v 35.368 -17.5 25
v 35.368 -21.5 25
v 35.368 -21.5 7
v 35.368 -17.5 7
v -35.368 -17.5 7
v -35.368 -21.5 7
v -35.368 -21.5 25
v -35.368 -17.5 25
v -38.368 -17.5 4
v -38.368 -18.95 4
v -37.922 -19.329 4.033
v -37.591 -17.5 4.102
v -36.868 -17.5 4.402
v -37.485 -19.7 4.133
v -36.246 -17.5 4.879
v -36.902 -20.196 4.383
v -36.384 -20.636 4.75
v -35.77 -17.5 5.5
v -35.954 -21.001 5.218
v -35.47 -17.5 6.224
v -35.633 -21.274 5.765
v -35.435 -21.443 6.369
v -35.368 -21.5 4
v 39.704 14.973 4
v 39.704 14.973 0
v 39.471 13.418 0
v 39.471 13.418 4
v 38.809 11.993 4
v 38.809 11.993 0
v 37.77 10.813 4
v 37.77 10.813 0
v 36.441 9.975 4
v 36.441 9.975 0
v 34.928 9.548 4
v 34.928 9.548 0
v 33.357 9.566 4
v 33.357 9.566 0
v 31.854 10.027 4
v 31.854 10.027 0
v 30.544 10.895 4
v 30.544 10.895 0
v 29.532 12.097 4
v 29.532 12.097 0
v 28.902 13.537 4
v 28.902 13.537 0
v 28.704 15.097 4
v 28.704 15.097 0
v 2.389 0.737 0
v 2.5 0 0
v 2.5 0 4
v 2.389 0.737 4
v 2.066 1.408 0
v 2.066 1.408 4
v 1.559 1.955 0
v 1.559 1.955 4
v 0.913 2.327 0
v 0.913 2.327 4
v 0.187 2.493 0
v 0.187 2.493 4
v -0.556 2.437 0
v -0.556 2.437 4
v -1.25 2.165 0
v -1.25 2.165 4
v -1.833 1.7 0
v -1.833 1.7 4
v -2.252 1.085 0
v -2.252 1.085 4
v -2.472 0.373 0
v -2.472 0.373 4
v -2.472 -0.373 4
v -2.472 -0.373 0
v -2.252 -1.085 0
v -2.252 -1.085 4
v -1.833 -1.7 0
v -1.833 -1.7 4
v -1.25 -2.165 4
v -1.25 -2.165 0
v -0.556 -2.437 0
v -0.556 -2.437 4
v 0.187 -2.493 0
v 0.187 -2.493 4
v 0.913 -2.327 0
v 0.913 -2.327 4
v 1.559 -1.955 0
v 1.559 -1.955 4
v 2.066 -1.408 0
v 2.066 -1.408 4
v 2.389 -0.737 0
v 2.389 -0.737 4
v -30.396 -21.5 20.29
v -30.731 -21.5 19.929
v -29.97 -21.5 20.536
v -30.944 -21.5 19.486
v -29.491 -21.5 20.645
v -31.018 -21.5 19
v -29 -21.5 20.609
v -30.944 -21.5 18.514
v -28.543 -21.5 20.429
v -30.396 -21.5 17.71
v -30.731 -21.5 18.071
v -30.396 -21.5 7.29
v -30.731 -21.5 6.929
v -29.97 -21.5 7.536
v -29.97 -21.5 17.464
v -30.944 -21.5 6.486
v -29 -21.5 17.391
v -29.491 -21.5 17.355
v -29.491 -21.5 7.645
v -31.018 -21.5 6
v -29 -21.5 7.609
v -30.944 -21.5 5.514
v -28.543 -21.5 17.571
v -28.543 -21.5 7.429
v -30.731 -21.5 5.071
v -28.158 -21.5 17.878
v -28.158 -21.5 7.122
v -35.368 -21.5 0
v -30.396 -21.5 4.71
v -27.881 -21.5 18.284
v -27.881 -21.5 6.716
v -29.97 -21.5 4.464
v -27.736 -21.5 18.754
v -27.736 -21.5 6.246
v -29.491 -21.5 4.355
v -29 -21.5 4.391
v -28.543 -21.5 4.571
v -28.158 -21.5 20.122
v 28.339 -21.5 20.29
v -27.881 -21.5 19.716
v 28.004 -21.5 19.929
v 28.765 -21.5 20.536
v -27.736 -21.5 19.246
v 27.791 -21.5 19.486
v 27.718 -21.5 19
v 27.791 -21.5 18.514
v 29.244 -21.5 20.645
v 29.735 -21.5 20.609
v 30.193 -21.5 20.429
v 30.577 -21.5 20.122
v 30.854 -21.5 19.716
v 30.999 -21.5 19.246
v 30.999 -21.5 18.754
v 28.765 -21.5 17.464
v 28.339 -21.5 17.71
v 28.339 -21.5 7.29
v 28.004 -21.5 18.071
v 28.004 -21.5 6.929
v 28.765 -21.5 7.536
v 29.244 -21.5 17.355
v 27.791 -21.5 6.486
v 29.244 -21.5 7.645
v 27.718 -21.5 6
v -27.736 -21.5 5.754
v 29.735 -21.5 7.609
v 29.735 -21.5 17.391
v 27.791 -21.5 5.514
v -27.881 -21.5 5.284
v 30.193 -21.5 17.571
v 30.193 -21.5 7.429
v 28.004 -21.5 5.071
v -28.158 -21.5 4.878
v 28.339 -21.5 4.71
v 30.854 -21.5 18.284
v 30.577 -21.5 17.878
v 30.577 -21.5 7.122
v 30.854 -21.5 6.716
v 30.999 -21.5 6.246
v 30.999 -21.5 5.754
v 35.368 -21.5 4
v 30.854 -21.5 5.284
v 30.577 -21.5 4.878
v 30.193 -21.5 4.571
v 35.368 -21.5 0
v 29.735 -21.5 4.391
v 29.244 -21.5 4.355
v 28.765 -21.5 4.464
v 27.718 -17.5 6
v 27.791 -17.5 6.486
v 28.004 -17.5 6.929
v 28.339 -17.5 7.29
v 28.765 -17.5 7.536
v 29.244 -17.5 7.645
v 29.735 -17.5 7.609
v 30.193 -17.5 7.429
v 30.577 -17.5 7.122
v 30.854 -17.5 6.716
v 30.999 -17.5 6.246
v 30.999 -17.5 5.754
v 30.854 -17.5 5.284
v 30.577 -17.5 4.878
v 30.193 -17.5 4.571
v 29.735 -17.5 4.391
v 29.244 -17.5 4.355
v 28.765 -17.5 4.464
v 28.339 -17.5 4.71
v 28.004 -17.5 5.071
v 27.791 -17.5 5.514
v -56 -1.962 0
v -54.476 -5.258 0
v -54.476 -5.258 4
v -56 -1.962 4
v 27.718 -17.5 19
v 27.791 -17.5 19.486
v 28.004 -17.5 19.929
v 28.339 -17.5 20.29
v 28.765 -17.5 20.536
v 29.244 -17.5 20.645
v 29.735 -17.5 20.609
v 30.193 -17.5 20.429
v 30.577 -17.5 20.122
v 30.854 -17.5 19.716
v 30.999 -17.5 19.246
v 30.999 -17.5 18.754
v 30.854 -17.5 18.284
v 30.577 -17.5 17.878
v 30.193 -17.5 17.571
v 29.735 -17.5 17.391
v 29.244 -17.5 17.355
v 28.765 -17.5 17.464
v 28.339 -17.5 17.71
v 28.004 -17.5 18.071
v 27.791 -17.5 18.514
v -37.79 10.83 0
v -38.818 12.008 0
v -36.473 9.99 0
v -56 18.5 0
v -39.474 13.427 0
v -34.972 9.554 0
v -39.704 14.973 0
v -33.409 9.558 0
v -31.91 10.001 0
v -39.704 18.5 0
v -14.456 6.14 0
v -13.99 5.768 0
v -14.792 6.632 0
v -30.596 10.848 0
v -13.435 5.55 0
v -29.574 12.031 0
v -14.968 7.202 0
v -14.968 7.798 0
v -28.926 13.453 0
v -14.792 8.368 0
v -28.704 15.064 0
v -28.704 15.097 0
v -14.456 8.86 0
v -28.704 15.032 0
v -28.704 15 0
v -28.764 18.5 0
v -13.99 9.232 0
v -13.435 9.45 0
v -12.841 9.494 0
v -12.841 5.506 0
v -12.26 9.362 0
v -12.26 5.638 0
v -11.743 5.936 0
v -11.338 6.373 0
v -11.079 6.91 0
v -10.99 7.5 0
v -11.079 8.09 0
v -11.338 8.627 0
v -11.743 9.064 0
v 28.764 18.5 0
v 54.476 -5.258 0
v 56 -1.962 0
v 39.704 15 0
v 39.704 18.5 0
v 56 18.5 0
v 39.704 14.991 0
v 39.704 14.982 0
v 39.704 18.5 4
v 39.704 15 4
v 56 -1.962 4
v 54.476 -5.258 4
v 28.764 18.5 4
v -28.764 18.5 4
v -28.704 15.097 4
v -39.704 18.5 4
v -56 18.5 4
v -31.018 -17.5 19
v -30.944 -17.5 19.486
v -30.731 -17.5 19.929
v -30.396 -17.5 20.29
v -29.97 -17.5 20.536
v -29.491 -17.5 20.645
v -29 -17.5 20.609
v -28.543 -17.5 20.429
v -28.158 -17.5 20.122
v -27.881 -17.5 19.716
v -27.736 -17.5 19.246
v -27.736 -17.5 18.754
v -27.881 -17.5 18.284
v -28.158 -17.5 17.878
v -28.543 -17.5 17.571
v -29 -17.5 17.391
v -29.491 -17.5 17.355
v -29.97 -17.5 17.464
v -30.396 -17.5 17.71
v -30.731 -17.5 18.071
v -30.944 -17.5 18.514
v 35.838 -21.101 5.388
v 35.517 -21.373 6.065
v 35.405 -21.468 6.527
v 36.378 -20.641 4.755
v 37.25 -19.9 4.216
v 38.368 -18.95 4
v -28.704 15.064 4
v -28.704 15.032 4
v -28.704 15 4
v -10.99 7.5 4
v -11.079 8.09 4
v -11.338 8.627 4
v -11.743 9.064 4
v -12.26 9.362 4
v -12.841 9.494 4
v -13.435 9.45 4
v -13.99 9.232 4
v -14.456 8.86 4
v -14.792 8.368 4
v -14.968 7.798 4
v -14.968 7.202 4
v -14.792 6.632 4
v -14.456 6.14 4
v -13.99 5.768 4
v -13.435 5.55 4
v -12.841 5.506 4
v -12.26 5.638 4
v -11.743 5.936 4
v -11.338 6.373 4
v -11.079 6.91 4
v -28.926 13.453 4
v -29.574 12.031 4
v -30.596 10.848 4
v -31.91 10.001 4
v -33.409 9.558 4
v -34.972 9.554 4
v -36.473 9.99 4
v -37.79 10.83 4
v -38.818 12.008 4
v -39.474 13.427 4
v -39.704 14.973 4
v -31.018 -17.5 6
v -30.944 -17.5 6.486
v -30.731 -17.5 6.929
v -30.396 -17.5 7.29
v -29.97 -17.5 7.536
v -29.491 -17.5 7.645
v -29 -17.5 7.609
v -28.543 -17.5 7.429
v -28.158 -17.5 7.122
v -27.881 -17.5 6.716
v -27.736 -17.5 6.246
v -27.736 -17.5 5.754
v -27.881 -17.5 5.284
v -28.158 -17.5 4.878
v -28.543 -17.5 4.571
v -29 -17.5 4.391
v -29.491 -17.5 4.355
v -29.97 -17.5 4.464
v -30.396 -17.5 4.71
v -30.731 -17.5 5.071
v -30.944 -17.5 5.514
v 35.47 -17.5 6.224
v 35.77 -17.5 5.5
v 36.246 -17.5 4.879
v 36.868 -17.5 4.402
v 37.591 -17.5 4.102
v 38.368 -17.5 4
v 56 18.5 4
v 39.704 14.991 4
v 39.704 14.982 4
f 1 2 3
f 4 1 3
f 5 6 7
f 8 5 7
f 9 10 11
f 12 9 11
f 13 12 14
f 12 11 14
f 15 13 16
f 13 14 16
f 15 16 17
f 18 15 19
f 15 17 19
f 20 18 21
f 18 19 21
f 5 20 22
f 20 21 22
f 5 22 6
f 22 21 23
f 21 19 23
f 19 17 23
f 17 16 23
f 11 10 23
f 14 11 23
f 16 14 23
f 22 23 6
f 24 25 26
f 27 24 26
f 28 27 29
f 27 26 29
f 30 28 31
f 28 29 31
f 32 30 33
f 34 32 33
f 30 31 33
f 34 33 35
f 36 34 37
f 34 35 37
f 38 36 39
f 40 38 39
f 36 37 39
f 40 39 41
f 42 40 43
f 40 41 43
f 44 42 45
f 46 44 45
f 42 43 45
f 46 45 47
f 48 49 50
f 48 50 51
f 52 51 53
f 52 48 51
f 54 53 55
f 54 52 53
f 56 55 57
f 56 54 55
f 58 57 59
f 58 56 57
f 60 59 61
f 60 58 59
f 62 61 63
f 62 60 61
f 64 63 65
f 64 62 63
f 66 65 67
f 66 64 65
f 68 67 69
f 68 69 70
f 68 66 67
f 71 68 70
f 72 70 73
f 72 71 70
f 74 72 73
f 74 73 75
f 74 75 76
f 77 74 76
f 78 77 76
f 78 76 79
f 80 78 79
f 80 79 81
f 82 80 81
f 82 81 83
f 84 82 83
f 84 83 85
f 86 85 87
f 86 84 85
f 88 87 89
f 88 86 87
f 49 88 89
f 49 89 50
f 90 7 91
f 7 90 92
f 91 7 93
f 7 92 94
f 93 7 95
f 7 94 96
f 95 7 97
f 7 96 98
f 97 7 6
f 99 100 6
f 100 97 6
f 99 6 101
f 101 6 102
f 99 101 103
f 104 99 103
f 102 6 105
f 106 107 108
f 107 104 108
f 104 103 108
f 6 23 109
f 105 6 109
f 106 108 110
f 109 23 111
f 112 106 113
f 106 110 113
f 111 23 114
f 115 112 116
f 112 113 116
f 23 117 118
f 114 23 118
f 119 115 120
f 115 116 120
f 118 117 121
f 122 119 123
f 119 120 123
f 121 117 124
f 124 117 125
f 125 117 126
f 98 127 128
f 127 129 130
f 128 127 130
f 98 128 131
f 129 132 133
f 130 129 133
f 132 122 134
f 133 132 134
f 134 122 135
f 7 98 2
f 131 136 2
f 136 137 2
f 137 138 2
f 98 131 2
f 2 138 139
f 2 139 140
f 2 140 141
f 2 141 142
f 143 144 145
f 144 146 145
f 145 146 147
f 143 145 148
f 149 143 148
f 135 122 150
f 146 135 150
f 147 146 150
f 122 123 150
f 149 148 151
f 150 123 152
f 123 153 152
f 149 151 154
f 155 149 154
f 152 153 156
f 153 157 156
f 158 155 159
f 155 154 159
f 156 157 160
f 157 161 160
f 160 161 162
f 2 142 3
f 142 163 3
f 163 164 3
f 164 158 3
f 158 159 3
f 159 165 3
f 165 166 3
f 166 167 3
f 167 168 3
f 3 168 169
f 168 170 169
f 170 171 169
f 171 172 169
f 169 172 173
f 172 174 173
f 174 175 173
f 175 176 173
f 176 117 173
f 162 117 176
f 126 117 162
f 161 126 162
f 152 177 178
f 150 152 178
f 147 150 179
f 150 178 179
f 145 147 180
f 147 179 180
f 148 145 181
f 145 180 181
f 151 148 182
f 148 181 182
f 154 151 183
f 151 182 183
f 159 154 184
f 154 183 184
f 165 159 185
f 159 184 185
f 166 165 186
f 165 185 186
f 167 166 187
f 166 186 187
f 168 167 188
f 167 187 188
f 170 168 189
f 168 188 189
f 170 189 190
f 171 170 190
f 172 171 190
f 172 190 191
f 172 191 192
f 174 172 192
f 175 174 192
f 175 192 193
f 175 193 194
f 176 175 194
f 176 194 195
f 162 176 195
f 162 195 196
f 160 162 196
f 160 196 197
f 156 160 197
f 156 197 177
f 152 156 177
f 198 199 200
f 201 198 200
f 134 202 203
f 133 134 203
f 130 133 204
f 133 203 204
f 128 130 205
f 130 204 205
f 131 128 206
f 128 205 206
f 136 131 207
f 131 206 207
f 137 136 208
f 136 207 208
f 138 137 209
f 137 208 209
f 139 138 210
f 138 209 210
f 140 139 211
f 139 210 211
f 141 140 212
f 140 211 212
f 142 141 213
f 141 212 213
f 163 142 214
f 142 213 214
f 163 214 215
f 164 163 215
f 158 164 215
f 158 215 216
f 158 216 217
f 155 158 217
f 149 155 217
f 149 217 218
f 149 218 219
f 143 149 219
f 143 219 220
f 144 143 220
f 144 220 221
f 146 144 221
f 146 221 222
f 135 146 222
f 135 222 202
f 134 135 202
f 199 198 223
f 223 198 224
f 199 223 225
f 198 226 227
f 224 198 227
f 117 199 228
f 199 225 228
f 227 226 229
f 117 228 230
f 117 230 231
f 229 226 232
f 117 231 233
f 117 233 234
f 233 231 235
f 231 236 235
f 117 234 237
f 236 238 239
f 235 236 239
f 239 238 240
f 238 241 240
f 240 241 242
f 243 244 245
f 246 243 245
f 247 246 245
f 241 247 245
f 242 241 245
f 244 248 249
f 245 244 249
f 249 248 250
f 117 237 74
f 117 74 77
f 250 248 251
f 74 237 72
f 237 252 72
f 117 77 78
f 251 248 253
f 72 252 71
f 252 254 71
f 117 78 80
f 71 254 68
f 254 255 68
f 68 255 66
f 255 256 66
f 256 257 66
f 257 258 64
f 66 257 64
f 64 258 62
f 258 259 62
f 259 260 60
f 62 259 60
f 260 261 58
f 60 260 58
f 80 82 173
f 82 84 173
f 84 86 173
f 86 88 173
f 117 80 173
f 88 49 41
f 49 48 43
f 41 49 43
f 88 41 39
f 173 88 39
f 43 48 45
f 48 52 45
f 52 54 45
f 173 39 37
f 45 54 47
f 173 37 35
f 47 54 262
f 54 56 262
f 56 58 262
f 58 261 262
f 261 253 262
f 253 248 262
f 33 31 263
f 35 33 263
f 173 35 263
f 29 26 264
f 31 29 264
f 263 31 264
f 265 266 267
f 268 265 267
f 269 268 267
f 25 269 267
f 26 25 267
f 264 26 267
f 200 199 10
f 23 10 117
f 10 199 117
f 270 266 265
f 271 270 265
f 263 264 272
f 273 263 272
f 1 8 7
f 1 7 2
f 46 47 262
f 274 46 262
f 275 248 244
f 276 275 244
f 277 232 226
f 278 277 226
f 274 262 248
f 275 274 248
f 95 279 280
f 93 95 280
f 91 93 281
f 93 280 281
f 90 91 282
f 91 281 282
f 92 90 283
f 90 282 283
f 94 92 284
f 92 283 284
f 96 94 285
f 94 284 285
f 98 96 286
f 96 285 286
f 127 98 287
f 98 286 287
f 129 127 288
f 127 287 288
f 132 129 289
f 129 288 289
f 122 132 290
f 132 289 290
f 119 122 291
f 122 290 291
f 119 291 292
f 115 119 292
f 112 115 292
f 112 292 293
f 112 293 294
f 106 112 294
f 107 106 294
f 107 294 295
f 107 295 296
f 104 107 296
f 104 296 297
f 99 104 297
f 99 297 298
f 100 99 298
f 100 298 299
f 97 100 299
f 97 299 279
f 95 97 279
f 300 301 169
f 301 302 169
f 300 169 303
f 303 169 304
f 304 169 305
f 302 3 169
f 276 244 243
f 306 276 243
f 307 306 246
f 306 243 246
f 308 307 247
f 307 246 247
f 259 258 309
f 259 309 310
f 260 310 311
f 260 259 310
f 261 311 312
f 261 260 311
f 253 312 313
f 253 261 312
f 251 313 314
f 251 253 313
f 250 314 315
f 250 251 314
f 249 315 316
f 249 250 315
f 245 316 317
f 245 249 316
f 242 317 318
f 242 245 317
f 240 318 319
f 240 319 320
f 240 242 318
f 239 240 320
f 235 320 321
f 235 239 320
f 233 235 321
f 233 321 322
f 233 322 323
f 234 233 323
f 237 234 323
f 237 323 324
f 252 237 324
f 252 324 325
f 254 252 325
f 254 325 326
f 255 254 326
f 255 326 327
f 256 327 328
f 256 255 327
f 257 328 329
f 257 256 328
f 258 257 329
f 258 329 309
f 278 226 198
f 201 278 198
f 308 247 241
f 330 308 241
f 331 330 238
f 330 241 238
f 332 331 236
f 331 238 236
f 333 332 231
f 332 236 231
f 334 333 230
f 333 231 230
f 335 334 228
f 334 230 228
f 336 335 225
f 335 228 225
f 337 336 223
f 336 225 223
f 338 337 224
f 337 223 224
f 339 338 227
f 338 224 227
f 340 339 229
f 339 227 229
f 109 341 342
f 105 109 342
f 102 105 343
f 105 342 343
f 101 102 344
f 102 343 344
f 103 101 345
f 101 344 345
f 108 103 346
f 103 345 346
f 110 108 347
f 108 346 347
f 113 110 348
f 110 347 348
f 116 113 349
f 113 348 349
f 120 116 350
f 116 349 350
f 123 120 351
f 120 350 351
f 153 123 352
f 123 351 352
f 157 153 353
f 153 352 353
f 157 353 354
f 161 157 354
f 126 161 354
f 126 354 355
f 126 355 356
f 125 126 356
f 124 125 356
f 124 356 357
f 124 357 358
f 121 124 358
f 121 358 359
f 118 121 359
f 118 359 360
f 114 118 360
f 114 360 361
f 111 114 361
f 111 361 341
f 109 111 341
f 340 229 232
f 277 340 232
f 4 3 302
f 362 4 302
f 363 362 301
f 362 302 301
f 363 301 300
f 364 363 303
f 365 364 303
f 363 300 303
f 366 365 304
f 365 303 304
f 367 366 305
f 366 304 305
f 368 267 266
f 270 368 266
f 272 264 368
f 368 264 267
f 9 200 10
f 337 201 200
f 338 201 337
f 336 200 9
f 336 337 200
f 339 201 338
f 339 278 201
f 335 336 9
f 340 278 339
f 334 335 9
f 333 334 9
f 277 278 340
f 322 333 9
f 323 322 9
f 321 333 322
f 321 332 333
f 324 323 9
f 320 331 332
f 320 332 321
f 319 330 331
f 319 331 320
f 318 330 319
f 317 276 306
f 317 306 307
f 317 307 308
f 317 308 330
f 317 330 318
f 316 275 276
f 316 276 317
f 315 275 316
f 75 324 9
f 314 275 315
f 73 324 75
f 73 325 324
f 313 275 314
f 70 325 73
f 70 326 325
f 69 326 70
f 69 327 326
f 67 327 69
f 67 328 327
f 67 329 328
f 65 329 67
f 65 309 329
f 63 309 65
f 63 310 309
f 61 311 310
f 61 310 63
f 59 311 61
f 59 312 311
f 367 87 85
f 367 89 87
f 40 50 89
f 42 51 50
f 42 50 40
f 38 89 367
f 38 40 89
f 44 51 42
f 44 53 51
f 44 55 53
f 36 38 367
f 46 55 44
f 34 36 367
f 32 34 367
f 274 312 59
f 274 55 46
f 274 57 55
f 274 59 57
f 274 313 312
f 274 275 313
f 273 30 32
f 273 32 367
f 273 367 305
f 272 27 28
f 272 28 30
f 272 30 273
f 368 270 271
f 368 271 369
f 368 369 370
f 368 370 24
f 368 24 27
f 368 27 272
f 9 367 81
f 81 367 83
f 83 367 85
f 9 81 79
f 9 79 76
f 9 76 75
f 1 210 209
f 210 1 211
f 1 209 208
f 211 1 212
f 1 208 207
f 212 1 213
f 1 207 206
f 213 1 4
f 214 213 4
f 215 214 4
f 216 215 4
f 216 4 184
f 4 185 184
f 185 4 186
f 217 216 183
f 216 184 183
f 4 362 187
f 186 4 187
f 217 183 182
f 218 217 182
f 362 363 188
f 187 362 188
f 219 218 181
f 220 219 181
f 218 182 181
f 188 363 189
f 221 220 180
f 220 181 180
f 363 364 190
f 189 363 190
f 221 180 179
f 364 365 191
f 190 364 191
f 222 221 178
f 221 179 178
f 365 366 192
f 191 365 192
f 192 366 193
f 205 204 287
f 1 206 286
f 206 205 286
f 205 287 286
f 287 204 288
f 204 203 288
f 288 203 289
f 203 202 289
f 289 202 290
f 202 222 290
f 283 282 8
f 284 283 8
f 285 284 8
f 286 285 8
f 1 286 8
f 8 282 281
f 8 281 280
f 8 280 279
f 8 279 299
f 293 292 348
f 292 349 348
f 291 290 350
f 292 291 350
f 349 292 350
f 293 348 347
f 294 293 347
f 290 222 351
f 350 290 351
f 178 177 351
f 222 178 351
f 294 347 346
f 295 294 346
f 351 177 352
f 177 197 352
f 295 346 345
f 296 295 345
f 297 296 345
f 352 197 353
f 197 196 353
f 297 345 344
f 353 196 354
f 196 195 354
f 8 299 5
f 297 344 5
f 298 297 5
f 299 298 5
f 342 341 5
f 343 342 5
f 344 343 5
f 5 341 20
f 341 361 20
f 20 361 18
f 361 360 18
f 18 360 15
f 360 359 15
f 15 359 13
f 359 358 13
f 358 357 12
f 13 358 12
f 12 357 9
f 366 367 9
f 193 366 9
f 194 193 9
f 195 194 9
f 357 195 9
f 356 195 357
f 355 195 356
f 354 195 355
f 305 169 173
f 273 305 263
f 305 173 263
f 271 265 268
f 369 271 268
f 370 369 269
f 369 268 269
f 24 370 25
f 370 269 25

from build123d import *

# Parameters (mm, degrees)
F0_R     = 2.5
F0_R_2   = 2
F1_DEPTH = 4
F3_DEPTH = 21
F5_DEPTH = 25
F6_D     = 3.3
F7_SIZE  = 2


# Not quite as in the source:
# - ends of sketch curves that miss each other by under 0.0002 mm in the source are joined


with BuildPart() as f1:
    # F0 (on Top) → F1 (new body)
    with BuildSketch(Plane.XY):
        with BuildLine():
            ThreePointArc((0, 18.5), (13.081475452, 13.081475452), (18.5, 0))
            ThreePointArc((18.5, 0), (-1.1345020789, -18.4651808828), (-18.3608545982, 2.2647336323))
            ThreePointArc((-18.3608545982, 2.2647336323), (-20.315445832, 5.8895882396), (-20.061448931, 9.9999998237))
            ThreePointArc((-20.061448931, 9.9999998237), (-38.4593739655, 0.6163893281), (-48.7895366382, 18.5))
            Line((-48.7895366382, 18.5), (-55, 18.5))
            Line((-55, 18.5), (-55, -3.5))
            Line((-55, -3.5), (-35, -20.5))
            Line((-35, -20.5), (0, -20.5))
            Line((0, -20.5), (35, -20.5))
            Line((35, -20.5), (55, -3.5))
            Line((55, -3.5), (55, 18.5))
            Line((55, 18.5), (39.703517094, 18.5))
            Line((39.703517094, 18.5), (39.703517094, 15))
            ThreePointArc((39.703517094, 15), (39.7035676427, 14.9863858353), (39.703517094, 14.9727717541))
            ThreePointArc((39.703517094, 14.9727717541), (34.1416723213, 9.5003484762), (28.7044327696, 15.096593634))
            Line((28.7044327696, 15.096593634), (28.7642142424, 18.5))
            Line((28.7642142424, 18.5), (0, 18.5))
        make_face()
        with BuildLine():
            ThreePointArc((-18.3608545982, 2.2647336323), (-1.1345020789, -18.4651808828), (18.5, 0))
            ThreePointArc((18.5, 0), (13.081475452, 13.081475452), (0, 18.5))
            ThreePointArc((0, 18.5), (-5.8749853417, 17.542364357), (-11.1417441574, 14.7685997011))
            ThreePointArc((-11.1417441574, 14.7685997011), (-7.0694530575, 12.1035433774), (-5.4903810568, 7.5))
            ThreePointArc((-5.4903810568, 7.5), (-5.7459373553, 5.5588571779), (-6.4951905116, 3.750000029))
            ThreePointArc((-6.4951905116, 3.750000029), (-12.0588494406, 0.0580749232), (-18.3608545982, 2.2647336323))
        make_face()
        with BuildLine():
            ThreePointArc((7.5, 0), (-1.9411428544, -7.2444436928), (-6.4951905116, 3.750000029))
            ThreePointArc((-6.4951905116, 3.750000029), (1.9411428544, 7.2444436928), (7.5, 0))
        make_face(mode=Mode.SUBTRACT)
        with BuildLine():
            ThreePointArc((7.5, 0), (1.9411428544, 7.2444436928), (-6.4951905116, 3.750000029))
            ThreePointArc((-6.4951905116, 3.750000029), (-1.9411428544, -7.2444436928), (7.5, 0))
        make_face()
        Circle(F0_R, mode=Mode.SUBTRACT)
        with BuildLine():
            ThreePointArc((-11.1417441574, 14.7685997011), (-16.02146997, 9.25), (-18.3608545982, 2.2647336323))
            ThreePointArc((-18.3608545982, 2.2647336323), (-12.0588494406, 0.0580749232), (-6.4951905116, 3.750000029))
            ThreePointArc((-6.4951905116, 3.750000029), (-5.7459373553, 5.5588571779), (-5.4903810568, 7.5))
            ThreePointArc((-5.4903810568, 7.5), (-7.0694530575, 12.1035433774), (-11.1417441574, 14.7685997011))
        make_face()
        with Locations((-12.9903810568, 7.5)):
            Circle(F0_R_2, mode=Mode.SUBTRACT)
        with BuildLine():
            ThreePointArc((-20.061448931, 9.9999998237), (-20.315445832, 5.8895882396), (-18.3608545982, 2.2647336323))
            ThreePointArc((-18.3608545982, 2.2647336323), (-16.02146997, 9.25), (-11.1417441574, 14.7685997011))
            ThreePointArc((-11.1417441574, 14.7685997011), (-16.5263862207, 14.1141263581), (-20.061448931, 9.9999998237))
        make_face()
        with BuildLine():
            ThreePointArc((-11.1417441574, 14.7685997011), (-5.8749853417, 17.542364357), (0, 18.5))
            Line((0, 18.5), (-19.6176323465, 18.5))
            ThreePointArc((-19.6176323465, 18.5), (-19.3074560996, 16.7622028562), (-19.2035844924, 15))
            ThreePointArc((-19.2035844924, 15), (-19.4196061134, 12.463470227), (-20.061448931, 9.9999998237))
            ThreePointArc((-20.061448931, 9.9999998237), (-16.5263862207, 14.1141263581), (-11.1417441574, 14.7685997011))
        make_face()
        with BuildLine():
            ThreePointArc((-19.2035844924, 15), (-19.3074560996, 16.7622028562), (-19.6176323465, 18.5))
            Line((-19.6176323465, 18.5), (-28.7642142424, 18.5))
            Line((-28.7642142424, 18.5), (-28.7044327696, 15.096593634))
            ThreePointArc((-28.7044327696, 15.096593634), (-28.7037965658, 15.0482986794), (-28.7035844924, 15))
            ThreePointArc((-28.7035844924, 15), (-34.1899703277, 9.5000168496), (-39.703517094, 14.9727717541))
            Line((-39.703517094, 14.9727717541), (-39.703517094, 18.5))
            Line((-39.703517094, 18.5), (-48.7895366382, 18.5))
            ThreePointArc((-48.7895366382, 18.5), (-38.4593739655, 0.6163893281), (-20.061448931, 9.9999998237))
            ThreePointArc((-20.061448931, 9.9999998237), (-19.4196061134, 12.463470227), (-19.2035844924, 15))
        make_face()
        Polygon((-55, -3.5), (-55, 18.5), (-56, 18.5), (-56, -3.9624404748), (-35.3675770292, -21.5), (0, -21.5), (35.3675770292, -21.5), (56, -3.9624404748), (56, 18.5), (55, 18.5), (55, -3.5), (35, -20.5), (0, -20.5), (-35, -20.5), align=None)
    extrude(amount=F1_DEPTH)

    # F2 (on face) → F3 (join)
    with BuildSketch(Plane.XY.offset(4)):
        Polygon((40.0734593822, -17.5), (-40.0734593822, -17.5), (-35.3675770292, -21.5), (35.3675770292, -21.5), align=None)
    extrude(amount=F3_DEPTH)

    # F4 (on face) → F5 (cut)
    with BuildSketch(Plane.XZ.offset(21.5)):
        with BuildLine():
            Line((-35.3675770292, 25), (-40.0734593822, 25))
            Line((-40.0734593822, 25), (-40.0734593822, 4))
            Line((-40.0734593822, 4), (-38.3675770292, 4))
            ThreePointArc((-38.3675770292, 4), (-36.2462566857, 4.8786796564), (-35.3675770292, 7))
            Line((-35.3675770292, 7), (-35.3675770292, 25))
        make_face()
        with BuildLine():
            Line((40.0734593822, 25), (35.3675770292, 25))
            Line((35.3675770292, 25), (35.3675770292, 7))
            ThreePointArc((35.3675770292, 7), (36.2462566857, 4.8786796564), (38.3675770292, 4))
            Line((38.3675770292, 4), (40.0734593822, 4))
            Line((40.0734593822, 4), (40.0734593822, 25))
        make_face()
    extrude(amount=-F5_DEPTH, mode=Mode.SUBTRACT)

    # F6 (through all)
    with Locations(Plane.XZ.offset(21.5)):
        with Locations((-29.3675770292, 19), (-29.3675770292, 6), (29.3675770292, 6), (29.3675770292, 19)):
            Hole(F6_D / 2)

    # F7
    f7_edges = [f1.edges().sort_by_distance(p)[0] for p in [
        (-56, -3.96244, 2),
        (56, -3.96244, 2),
    ]]
    chamfer(f7_edges, length=F7_SIZE)


solid = f1.part
